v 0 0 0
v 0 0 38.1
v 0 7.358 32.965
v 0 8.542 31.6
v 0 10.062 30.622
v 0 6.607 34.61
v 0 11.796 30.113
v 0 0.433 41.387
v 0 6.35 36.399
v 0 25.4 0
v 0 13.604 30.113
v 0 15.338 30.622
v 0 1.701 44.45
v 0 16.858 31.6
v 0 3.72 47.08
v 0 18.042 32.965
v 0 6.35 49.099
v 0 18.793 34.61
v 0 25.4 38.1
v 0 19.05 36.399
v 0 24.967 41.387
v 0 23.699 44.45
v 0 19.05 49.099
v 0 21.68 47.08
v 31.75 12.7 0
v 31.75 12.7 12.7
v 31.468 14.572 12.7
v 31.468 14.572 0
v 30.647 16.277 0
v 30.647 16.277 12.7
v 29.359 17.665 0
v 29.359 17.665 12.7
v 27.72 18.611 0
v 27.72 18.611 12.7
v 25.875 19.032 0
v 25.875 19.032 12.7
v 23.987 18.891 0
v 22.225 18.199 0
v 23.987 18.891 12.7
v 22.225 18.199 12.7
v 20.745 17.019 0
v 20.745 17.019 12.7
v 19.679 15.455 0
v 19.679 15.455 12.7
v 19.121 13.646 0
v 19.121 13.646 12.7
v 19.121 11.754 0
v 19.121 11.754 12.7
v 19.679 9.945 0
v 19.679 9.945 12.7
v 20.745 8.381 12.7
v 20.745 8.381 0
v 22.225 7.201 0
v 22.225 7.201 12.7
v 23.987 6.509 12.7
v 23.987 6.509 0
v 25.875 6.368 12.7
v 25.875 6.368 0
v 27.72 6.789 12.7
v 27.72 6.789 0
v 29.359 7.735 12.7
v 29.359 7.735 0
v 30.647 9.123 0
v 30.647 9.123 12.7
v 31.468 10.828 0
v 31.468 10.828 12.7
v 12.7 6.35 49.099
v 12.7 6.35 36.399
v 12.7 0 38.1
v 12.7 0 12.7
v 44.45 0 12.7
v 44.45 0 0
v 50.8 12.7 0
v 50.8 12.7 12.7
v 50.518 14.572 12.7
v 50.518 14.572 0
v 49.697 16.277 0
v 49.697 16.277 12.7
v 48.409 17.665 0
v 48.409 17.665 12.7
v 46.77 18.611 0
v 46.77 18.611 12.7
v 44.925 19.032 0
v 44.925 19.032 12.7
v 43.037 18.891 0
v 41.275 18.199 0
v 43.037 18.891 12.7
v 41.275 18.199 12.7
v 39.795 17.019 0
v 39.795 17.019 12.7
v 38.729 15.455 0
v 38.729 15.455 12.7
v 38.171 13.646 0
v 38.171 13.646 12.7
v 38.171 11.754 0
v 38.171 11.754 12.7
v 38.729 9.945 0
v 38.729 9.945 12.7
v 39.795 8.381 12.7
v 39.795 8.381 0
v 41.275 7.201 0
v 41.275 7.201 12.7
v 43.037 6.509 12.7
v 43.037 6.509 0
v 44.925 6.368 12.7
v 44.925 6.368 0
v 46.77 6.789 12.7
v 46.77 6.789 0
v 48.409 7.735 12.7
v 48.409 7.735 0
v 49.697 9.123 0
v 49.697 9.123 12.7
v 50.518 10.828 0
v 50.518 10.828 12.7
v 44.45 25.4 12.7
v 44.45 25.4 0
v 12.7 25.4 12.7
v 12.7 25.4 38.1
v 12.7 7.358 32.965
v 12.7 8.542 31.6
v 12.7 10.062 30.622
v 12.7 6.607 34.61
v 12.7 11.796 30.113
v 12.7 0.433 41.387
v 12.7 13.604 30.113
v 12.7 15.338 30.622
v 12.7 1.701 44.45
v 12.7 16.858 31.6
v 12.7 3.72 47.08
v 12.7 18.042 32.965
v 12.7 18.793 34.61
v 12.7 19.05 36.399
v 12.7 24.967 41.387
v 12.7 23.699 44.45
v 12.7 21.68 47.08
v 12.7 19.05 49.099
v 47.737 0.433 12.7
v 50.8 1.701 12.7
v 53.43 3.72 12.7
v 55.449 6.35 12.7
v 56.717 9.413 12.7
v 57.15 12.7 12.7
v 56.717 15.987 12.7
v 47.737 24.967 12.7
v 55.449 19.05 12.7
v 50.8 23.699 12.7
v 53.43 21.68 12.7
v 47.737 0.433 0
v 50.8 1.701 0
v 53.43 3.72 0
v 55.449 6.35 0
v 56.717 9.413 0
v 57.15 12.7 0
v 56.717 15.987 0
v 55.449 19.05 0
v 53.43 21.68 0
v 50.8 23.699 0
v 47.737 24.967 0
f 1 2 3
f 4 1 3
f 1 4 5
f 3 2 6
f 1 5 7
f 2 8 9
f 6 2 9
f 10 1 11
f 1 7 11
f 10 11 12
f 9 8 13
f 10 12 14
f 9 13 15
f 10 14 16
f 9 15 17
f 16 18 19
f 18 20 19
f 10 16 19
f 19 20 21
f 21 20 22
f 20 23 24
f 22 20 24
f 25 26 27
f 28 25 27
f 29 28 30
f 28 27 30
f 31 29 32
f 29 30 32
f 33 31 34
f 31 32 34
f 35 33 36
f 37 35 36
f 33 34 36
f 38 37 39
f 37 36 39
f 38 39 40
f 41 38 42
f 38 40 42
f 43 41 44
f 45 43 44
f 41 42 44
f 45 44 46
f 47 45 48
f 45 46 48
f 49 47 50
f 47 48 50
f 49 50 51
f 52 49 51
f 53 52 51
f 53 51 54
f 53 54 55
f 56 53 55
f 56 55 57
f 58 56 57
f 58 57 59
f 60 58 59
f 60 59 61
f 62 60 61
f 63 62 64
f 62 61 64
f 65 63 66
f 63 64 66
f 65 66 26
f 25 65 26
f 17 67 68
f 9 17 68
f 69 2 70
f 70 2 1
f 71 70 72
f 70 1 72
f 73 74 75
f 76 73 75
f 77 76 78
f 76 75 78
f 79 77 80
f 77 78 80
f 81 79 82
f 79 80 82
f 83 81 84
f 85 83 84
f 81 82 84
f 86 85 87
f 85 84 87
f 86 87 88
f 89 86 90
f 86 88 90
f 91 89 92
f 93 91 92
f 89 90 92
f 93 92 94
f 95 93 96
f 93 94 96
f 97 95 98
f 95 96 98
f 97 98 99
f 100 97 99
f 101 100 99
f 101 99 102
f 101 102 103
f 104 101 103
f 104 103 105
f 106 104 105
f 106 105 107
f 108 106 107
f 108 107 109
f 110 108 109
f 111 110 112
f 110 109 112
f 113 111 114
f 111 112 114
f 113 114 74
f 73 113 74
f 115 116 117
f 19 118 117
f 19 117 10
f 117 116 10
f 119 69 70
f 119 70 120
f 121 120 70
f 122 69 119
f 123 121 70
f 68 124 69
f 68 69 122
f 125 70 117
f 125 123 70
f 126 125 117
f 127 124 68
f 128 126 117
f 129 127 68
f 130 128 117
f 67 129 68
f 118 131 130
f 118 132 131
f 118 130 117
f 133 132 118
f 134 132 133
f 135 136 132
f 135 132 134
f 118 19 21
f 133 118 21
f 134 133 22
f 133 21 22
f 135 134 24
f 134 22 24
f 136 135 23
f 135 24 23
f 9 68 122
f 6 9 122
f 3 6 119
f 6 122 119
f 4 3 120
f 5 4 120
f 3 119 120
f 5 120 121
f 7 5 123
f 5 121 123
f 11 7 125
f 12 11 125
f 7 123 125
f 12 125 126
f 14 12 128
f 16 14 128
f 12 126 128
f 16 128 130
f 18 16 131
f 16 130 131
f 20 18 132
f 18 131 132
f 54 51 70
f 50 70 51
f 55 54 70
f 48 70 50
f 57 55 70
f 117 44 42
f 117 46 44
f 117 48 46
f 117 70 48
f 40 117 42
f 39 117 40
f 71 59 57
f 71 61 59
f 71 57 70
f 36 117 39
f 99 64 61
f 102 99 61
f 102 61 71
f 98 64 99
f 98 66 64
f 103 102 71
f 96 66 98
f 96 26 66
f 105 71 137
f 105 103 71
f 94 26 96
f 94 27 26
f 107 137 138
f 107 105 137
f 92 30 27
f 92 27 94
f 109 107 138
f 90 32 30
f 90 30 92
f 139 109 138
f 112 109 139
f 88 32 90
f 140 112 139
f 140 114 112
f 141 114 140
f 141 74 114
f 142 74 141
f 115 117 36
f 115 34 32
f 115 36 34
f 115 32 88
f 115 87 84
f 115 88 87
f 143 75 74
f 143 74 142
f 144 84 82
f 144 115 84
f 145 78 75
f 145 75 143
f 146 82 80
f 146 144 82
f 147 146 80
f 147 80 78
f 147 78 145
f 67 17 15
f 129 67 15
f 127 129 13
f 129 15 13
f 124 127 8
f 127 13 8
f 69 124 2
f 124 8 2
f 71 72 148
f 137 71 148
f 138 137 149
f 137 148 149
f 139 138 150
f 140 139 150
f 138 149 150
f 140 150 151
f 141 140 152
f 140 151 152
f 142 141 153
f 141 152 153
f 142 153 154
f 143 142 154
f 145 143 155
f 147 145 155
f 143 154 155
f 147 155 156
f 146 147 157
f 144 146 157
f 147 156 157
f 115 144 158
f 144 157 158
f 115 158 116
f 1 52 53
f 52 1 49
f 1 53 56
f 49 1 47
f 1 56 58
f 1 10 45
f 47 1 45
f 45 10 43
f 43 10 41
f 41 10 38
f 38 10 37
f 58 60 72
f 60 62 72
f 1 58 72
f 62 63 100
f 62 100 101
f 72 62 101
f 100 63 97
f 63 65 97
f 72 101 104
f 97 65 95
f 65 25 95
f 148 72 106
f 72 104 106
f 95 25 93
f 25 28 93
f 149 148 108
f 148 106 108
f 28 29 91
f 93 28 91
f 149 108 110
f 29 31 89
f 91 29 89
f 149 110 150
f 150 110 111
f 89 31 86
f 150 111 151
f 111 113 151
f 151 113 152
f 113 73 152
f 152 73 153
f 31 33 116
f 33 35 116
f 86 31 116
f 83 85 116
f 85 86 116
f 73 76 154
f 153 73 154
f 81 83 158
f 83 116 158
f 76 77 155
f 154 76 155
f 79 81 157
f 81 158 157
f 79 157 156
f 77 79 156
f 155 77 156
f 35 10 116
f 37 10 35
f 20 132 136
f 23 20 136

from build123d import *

# Parameters (mm, degrees)
F1_DEPTH = 12.7
F3_DEPTH = 12.7
F5_DEPTH = 12.7
F6_R     = 6.35
F7_DEPTH = 12.7


with BuildPart() as f1:
    # F0 (on Right) → F1 (new body)
    with BuildSketch(Plane.YZ):
        with BuildLine():
            ThreePointArc((25.4, 38.1), (12.7, 50.8), (0, 38.1))
            Line((0, 38.1), (25.4, 38.1))
        make_face()
        with BuildLine():
            Line((25.4, 38.1), (0, 38.1))
            ThreePointArc((0, 38.1), (12.7, 25.4), (25.4, 38.1))
        make_face()
        with BuildLine():
            Line((0, 38.1), (0, 0))
            Line((0, 0), (25.4, 0))
            Line((25.4, 0), (25.4, 38.1))
            ThreePointArc((25.4, 38.1), (12.7, 25.4), (0, 38.1))
        make_face()
    extrude(amount=F1_DEPTH)

    # F2 (on face) → F3 (cut)
    with BuildSketch(Plane.YZ.offset(12.7)):
        with BuildLine():
            Line((19.05, 49.098523), (6.35, 49.098523))
            Line((6.35, 49.098523), (6.35, 36.398523))
            ThreePointArc((6.35, 36.398523), (12.7, 42.748523), (19.05, 36.398523))
            Line((19.05, 36.398523), (19.05, 49.098523))
        make_face()
        with BuildLine():
            ThreePointArc((19.05, 36.398523), (12.7, 42.748523), (6.35, 36.398523))
            Line((6.35, 36.398523), (19.05, 36.398523))
        make_face()
        with BuildLine():
            Line((19.05, 36.398523), (6.35, 36.398523))
            ThreePointArc((6.35, 36.398523), (12.7, 30.048523), (19.05, 36.398523))
        make_face()
        with BuildLine():
            ThreePointArc((19.05, 49.098523), (12.7, 50.8), (6.35, 49.098523))
            Line((6.35, 49.098523), (19.05, 49.098523))
        make_face()
    extrude(amount=-F3_DEPTH, mode=Mode.SUBTRACT)

    # F4 (on Top) → F5 (join)
    with BuildSketch(Plane.XY):
        with BuildLine():
            Line((44.45, 25.4), (44.45, 0))
            ThreePointArc((44.45, 0), (53.430256, 3.719744), (57.15, 12.7))
            ThreePointArc((57.15, 12.7), (53.430256, 21.680256), (44.45, 25.4))
        make_face()
        with BuildLine():
            ThreePointArc((44.45, 25.4), (31.75, 12.7), (44.45, 0))
            Line((44.45, 0), (44.45, 25.4))
        make_face()
        with BuildLine():
            Line((12.7, 25.4), (12.7, 0))
            Line((12.7, 0), (44.45, 0))
            ThreePointArc((44.45, 0), (31.75, 12.7), (44.45, 25.4))
            Line((44.45, 25.4), (12.7, 25.4))
        make_face()
    extrude(amount=F5_DEPTH)

    # F6 (on face) → F7 (cut)
    with BuildSketch(Plane.XY.offset(12.7)):
        with Locations((44.45, 12.7)):
            Circle(F6_R)
        with Locations((25.4, 12.7)):
            Circle(F6_R)
    extrude(amount=-F7_DEPTH, mode=Mode.SUBTRACT)


solid = f1.part
